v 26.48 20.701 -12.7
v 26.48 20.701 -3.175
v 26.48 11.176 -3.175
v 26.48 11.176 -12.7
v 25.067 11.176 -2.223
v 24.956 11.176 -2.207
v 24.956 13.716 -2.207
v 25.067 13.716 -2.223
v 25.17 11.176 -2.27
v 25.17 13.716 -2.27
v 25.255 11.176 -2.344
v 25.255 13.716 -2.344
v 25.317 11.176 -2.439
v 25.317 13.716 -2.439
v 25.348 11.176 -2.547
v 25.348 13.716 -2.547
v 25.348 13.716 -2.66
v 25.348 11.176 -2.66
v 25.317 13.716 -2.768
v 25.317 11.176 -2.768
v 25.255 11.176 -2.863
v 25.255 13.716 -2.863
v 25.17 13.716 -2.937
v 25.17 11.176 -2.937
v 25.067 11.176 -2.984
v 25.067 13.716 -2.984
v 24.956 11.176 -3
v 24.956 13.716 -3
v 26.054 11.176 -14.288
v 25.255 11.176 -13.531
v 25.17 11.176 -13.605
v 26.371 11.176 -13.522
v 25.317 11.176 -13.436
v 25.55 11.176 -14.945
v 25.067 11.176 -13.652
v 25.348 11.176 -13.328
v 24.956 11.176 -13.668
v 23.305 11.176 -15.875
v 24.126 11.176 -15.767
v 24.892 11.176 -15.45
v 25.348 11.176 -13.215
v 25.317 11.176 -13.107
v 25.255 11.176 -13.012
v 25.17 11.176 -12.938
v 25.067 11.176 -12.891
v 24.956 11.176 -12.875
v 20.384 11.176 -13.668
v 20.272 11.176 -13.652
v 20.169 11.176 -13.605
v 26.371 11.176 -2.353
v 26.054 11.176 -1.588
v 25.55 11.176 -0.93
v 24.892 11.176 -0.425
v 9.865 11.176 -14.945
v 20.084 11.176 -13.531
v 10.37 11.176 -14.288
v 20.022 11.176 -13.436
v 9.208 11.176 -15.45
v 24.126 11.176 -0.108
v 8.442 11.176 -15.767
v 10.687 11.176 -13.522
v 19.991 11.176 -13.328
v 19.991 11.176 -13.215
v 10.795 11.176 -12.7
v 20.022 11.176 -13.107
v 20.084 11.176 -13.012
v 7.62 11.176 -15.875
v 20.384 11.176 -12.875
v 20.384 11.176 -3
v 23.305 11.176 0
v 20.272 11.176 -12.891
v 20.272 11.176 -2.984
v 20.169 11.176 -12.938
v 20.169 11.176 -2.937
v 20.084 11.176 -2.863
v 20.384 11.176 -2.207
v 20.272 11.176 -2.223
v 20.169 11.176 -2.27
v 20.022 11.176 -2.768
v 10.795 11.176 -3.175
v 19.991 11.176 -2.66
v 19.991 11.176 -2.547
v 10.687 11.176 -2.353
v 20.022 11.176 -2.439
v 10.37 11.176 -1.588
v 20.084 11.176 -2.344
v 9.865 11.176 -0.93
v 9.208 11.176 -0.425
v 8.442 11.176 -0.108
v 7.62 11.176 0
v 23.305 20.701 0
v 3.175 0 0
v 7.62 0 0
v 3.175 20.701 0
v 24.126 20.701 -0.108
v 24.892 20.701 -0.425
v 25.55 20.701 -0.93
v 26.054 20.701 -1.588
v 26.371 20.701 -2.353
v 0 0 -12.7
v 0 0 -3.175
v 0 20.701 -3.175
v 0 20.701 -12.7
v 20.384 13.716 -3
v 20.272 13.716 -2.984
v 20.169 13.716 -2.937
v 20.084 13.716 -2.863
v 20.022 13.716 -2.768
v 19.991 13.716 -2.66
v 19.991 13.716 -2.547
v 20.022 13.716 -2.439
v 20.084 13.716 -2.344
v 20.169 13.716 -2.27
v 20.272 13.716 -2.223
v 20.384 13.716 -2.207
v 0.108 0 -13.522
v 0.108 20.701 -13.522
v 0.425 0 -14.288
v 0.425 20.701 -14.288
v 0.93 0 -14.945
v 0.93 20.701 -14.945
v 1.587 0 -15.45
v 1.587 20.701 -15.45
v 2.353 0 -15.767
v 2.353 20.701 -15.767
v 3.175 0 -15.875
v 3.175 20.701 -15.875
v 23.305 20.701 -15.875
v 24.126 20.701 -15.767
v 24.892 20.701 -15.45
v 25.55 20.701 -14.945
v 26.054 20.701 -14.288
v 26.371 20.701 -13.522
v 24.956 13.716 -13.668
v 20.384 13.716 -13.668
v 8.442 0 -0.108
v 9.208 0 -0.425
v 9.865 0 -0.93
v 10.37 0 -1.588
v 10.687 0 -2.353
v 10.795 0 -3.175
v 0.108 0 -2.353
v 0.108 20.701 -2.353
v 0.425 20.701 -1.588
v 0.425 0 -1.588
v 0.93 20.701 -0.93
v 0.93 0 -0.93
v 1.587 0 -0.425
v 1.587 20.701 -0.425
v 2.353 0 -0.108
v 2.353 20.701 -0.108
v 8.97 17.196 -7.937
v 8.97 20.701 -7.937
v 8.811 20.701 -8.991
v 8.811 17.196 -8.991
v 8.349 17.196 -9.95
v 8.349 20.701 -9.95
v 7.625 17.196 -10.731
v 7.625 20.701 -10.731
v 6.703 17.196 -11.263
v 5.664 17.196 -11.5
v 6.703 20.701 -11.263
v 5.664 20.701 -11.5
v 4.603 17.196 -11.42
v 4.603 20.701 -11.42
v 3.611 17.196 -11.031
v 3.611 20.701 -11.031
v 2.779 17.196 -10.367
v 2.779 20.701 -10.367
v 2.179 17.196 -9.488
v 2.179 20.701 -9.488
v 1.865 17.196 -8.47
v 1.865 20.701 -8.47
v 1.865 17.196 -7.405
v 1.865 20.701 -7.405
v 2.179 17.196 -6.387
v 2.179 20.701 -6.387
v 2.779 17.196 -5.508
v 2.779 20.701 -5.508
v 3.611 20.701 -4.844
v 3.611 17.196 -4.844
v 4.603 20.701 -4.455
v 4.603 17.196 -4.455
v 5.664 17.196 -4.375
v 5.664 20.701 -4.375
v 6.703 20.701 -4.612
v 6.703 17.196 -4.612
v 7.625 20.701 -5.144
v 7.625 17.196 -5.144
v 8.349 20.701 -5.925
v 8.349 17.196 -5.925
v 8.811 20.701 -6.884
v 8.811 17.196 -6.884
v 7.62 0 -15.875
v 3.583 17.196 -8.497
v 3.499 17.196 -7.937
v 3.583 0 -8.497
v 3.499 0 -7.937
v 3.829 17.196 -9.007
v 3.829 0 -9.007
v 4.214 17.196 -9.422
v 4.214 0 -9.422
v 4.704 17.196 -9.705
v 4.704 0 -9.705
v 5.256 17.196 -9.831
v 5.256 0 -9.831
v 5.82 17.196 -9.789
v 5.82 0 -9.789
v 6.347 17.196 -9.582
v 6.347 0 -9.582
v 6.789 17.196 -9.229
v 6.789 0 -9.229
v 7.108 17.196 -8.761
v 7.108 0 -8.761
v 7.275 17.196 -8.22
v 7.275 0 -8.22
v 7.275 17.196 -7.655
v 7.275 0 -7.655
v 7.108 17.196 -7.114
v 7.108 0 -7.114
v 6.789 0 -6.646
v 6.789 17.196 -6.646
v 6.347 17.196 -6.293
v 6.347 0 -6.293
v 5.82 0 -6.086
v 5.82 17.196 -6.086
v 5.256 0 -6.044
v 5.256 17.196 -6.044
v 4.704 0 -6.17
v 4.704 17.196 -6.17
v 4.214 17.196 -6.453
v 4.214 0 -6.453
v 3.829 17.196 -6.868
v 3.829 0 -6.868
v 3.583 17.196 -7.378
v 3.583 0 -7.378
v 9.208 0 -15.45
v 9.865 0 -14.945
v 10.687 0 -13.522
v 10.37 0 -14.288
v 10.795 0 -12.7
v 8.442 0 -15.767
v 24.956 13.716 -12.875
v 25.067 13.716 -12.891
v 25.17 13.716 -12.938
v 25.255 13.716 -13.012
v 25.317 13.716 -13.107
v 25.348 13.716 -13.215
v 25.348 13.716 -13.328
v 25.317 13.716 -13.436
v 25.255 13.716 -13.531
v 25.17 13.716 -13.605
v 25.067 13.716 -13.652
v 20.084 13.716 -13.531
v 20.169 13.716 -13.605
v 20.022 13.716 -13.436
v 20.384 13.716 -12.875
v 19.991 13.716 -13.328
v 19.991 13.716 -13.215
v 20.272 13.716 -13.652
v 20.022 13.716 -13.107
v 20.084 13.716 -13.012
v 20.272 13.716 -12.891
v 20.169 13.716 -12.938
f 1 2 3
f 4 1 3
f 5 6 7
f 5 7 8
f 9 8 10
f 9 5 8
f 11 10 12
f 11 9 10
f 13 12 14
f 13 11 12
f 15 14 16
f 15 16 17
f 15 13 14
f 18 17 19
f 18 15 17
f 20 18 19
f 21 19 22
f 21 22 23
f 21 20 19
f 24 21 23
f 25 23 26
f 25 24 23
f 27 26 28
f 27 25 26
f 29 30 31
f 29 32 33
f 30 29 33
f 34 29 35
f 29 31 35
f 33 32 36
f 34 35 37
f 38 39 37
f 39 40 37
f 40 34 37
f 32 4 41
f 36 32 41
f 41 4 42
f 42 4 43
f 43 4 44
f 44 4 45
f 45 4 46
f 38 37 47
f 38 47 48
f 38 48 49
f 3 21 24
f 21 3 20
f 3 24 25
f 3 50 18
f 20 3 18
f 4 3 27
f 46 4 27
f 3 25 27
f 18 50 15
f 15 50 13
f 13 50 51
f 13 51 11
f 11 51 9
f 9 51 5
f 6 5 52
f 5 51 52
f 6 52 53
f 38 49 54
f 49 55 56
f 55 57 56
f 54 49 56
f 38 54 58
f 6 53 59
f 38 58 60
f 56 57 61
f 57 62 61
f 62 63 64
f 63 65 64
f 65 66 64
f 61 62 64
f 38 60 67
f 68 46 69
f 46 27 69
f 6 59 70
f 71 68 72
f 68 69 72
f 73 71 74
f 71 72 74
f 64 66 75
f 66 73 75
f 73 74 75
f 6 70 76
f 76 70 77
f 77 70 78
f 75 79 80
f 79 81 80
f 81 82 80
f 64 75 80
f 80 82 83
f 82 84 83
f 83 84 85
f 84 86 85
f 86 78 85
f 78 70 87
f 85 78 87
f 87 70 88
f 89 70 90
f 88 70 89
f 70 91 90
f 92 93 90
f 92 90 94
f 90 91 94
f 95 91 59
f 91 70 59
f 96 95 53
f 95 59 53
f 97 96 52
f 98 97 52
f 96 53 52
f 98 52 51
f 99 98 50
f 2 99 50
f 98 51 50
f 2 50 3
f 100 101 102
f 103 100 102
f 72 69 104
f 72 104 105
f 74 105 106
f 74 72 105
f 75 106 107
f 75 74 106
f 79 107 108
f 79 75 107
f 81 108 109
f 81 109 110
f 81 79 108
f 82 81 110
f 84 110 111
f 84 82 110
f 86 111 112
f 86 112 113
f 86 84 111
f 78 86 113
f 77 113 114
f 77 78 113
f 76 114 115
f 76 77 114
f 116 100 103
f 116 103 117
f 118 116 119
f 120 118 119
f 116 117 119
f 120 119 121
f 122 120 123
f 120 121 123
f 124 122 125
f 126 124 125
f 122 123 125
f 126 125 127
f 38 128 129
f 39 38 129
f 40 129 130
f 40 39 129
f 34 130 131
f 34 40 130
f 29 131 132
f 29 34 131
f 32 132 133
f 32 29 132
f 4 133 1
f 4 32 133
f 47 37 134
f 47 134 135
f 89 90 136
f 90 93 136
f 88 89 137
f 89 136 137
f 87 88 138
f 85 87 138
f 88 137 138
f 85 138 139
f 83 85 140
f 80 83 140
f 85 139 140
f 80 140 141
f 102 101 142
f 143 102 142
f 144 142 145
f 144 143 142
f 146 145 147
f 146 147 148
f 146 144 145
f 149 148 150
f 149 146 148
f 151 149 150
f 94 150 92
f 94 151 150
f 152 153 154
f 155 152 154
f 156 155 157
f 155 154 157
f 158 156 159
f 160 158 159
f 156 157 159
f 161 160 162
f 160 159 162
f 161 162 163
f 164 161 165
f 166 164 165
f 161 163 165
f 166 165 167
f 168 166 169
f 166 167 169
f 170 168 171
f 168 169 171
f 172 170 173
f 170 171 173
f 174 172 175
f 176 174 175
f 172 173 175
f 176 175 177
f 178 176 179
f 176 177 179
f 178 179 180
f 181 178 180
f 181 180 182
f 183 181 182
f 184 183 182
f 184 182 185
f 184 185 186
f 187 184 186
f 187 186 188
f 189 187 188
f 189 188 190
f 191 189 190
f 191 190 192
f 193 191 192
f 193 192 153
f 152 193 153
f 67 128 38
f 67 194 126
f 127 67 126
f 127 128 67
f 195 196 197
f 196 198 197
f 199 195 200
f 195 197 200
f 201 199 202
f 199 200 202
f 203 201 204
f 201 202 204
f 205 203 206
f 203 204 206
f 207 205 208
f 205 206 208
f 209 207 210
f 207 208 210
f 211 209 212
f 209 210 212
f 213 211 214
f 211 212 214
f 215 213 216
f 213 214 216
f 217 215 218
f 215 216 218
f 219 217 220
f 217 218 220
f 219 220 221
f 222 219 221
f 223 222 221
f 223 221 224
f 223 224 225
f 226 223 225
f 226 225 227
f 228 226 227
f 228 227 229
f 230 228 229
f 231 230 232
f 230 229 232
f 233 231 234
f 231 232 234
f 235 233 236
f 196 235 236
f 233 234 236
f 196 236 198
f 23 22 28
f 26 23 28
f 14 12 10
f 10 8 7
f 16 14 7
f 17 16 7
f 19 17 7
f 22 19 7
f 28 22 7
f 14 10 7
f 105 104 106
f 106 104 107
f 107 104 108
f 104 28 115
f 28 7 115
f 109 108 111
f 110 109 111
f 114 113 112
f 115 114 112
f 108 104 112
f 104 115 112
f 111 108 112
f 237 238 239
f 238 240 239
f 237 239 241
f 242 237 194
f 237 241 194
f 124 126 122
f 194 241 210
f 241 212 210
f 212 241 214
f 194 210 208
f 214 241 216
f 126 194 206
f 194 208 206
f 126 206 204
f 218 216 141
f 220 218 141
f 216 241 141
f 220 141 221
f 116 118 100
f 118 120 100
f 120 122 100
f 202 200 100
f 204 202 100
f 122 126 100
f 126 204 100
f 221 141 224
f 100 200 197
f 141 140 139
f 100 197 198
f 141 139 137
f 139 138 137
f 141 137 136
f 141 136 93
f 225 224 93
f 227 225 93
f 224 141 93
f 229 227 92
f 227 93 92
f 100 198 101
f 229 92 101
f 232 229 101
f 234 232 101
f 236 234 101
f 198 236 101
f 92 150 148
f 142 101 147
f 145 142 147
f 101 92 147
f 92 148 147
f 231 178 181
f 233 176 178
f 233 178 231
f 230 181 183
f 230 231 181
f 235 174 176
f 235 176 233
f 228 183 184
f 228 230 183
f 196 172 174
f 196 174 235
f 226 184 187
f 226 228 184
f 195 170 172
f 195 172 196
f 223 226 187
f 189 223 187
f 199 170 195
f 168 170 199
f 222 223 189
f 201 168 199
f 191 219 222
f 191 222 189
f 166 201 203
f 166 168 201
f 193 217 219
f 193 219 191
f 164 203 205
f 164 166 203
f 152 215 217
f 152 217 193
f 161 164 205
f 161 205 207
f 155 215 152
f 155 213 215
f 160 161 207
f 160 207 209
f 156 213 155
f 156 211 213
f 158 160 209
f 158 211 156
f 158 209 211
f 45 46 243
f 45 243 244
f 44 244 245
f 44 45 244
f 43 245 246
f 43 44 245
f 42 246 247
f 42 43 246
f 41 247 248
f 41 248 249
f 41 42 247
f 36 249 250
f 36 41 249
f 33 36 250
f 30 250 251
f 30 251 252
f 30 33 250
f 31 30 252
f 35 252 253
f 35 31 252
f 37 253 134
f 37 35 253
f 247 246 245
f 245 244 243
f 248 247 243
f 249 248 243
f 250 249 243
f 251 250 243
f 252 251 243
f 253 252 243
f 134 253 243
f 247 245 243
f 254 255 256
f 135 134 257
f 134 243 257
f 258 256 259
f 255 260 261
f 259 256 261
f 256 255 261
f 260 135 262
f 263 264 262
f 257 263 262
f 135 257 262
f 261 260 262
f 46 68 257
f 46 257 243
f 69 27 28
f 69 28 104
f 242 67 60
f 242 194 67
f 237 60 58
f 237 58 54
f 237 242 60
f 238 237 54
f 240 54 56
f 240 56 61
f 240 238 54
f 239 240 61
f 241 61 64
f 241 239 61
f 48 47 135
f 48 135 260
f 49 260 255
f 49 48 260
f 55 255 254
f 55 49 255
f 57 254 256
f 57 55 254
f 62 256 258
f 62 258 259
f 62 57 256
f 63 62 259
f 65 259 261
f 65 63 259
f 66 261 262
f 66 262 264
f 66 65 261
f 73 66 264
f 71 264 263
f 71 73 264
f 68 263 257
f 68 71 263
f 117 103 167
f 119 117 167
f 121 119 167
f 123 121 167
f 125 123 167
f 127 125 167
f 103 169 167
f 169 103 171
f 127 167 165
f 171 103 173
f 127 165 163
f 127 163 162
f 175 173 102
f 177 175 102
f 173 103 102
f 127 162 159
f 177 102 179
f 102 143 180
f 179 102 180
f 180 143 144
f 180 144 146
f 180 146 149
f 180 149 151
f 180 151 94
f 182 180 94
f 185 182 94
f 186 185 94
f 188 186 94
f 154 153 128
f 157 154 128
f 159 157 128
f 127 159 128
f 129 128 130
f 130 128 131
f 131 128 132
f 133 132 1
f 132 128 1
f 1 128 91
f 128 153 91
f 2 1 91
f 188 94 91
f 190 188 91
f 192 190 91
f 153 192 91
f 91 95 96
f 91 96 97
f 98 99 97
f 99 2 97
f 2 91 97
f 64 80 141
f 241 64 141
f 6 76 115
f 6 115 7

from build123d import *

# Parameters (mm, degrees)
BOSS_EXTRUDE1_DEPTH                            = 15.875
CBORE_FOR_6_SOCKET_HEAD_CAP_SCREW1_D           = 3.7973
CBORE_FOR_6_SOCKET_HEAD_CAP_SCREW1_CBORE_D     = 7.14502
CBORE_FOR_6_SOCKET_HEAD_CAP_SCREW1_CBORE_DEPTH = 3.5052
CUT_EXTRUDE2_DEPTH                             = 2.54
FILLET1_R                                      = 3.175


with BuildPart() as part:
    # Sketch1 → Boss-Extrude1 (new body)
    with BuildSketch(Plane.XY):
        Polygon((0, 0), (0, 20.701), (26.4795, 20.701), (26.4795, 11.176), (10.795, 11.176), (10.795, 0), align=None)
    extrude(amount=-BOSS_EXTRUDE1_DEPTH)

    # CBORE for #6 Socket Head Cap Screw1 (through all)
    with Locations(Plane(origin=(0, 20.701, 0), x_dir=(1, 0, 0), z_dir=(0, 1, 0))):
        with Locations((5.3975, 7.9375)):
            CounterBoreHole(CBORE_FOR_6_SOCKET_HEAD_CAP_SCREW1_D / 2, CBORE_FOR_6_SOCKET_HEAD_CAP_SCREW1_CBORE_D / 2, CBORE_FOR_6_SOCKET_HEAD_CAP_SCREW1_CBORE_DEPTH)

    # Sketch5 → Cut-Extrude2 (cut)
    with BuildSketch(Plane.XZ.offset(-11.176)):
        with BuildLine():
            Line((20.3835, -2.206625), (24.9555, -2.206625))
            ThreePointArc((24.9555, -2.206625), (25.352375, -2.6035), (24.9555, -3.000375))
            Line((24.9555, -3.000375), (20.3835, -3.000375))
            ThreePointArc((20.3835, -3.000375), (19.986625, -2.6035), (20.3835, -2.206625))
        make_face()
        with BuildLine():
            Line((20.3835, -12.874625), (24.9555, -12.874625))
            ThreePointArc((24.9555, -12.874625), (25.352375, -13.2715), (24.9555, -13.668375))
            Line((24.9555, -13.668375), (20.3835, -13.668375))
            ThreePointArc((20.3835, -13.668375), (19.986625, -13.2715), (20.3835, -12.874625))
        make_face()
    extrude(amount=-CUT_EXTRUDE2_DEPTH, mode=Mode.SUBTRACT)

    # Fillet1
    fillet1_edges = [part.edges().sort_by_distance(p)[0] for p in [
        (26.4795, 15.9385, -15.875),
        (0, 10.3505, -15.875),
        (0, 10.3505, 0),
        (26.4795, 15.9385, 0),
        (10.795, 5.588, -15.875),
        (10.795, 5.588, 0),
    ]]
    fillet(fillet1_edges, radius=FILLET1_R)


solid = part.part
